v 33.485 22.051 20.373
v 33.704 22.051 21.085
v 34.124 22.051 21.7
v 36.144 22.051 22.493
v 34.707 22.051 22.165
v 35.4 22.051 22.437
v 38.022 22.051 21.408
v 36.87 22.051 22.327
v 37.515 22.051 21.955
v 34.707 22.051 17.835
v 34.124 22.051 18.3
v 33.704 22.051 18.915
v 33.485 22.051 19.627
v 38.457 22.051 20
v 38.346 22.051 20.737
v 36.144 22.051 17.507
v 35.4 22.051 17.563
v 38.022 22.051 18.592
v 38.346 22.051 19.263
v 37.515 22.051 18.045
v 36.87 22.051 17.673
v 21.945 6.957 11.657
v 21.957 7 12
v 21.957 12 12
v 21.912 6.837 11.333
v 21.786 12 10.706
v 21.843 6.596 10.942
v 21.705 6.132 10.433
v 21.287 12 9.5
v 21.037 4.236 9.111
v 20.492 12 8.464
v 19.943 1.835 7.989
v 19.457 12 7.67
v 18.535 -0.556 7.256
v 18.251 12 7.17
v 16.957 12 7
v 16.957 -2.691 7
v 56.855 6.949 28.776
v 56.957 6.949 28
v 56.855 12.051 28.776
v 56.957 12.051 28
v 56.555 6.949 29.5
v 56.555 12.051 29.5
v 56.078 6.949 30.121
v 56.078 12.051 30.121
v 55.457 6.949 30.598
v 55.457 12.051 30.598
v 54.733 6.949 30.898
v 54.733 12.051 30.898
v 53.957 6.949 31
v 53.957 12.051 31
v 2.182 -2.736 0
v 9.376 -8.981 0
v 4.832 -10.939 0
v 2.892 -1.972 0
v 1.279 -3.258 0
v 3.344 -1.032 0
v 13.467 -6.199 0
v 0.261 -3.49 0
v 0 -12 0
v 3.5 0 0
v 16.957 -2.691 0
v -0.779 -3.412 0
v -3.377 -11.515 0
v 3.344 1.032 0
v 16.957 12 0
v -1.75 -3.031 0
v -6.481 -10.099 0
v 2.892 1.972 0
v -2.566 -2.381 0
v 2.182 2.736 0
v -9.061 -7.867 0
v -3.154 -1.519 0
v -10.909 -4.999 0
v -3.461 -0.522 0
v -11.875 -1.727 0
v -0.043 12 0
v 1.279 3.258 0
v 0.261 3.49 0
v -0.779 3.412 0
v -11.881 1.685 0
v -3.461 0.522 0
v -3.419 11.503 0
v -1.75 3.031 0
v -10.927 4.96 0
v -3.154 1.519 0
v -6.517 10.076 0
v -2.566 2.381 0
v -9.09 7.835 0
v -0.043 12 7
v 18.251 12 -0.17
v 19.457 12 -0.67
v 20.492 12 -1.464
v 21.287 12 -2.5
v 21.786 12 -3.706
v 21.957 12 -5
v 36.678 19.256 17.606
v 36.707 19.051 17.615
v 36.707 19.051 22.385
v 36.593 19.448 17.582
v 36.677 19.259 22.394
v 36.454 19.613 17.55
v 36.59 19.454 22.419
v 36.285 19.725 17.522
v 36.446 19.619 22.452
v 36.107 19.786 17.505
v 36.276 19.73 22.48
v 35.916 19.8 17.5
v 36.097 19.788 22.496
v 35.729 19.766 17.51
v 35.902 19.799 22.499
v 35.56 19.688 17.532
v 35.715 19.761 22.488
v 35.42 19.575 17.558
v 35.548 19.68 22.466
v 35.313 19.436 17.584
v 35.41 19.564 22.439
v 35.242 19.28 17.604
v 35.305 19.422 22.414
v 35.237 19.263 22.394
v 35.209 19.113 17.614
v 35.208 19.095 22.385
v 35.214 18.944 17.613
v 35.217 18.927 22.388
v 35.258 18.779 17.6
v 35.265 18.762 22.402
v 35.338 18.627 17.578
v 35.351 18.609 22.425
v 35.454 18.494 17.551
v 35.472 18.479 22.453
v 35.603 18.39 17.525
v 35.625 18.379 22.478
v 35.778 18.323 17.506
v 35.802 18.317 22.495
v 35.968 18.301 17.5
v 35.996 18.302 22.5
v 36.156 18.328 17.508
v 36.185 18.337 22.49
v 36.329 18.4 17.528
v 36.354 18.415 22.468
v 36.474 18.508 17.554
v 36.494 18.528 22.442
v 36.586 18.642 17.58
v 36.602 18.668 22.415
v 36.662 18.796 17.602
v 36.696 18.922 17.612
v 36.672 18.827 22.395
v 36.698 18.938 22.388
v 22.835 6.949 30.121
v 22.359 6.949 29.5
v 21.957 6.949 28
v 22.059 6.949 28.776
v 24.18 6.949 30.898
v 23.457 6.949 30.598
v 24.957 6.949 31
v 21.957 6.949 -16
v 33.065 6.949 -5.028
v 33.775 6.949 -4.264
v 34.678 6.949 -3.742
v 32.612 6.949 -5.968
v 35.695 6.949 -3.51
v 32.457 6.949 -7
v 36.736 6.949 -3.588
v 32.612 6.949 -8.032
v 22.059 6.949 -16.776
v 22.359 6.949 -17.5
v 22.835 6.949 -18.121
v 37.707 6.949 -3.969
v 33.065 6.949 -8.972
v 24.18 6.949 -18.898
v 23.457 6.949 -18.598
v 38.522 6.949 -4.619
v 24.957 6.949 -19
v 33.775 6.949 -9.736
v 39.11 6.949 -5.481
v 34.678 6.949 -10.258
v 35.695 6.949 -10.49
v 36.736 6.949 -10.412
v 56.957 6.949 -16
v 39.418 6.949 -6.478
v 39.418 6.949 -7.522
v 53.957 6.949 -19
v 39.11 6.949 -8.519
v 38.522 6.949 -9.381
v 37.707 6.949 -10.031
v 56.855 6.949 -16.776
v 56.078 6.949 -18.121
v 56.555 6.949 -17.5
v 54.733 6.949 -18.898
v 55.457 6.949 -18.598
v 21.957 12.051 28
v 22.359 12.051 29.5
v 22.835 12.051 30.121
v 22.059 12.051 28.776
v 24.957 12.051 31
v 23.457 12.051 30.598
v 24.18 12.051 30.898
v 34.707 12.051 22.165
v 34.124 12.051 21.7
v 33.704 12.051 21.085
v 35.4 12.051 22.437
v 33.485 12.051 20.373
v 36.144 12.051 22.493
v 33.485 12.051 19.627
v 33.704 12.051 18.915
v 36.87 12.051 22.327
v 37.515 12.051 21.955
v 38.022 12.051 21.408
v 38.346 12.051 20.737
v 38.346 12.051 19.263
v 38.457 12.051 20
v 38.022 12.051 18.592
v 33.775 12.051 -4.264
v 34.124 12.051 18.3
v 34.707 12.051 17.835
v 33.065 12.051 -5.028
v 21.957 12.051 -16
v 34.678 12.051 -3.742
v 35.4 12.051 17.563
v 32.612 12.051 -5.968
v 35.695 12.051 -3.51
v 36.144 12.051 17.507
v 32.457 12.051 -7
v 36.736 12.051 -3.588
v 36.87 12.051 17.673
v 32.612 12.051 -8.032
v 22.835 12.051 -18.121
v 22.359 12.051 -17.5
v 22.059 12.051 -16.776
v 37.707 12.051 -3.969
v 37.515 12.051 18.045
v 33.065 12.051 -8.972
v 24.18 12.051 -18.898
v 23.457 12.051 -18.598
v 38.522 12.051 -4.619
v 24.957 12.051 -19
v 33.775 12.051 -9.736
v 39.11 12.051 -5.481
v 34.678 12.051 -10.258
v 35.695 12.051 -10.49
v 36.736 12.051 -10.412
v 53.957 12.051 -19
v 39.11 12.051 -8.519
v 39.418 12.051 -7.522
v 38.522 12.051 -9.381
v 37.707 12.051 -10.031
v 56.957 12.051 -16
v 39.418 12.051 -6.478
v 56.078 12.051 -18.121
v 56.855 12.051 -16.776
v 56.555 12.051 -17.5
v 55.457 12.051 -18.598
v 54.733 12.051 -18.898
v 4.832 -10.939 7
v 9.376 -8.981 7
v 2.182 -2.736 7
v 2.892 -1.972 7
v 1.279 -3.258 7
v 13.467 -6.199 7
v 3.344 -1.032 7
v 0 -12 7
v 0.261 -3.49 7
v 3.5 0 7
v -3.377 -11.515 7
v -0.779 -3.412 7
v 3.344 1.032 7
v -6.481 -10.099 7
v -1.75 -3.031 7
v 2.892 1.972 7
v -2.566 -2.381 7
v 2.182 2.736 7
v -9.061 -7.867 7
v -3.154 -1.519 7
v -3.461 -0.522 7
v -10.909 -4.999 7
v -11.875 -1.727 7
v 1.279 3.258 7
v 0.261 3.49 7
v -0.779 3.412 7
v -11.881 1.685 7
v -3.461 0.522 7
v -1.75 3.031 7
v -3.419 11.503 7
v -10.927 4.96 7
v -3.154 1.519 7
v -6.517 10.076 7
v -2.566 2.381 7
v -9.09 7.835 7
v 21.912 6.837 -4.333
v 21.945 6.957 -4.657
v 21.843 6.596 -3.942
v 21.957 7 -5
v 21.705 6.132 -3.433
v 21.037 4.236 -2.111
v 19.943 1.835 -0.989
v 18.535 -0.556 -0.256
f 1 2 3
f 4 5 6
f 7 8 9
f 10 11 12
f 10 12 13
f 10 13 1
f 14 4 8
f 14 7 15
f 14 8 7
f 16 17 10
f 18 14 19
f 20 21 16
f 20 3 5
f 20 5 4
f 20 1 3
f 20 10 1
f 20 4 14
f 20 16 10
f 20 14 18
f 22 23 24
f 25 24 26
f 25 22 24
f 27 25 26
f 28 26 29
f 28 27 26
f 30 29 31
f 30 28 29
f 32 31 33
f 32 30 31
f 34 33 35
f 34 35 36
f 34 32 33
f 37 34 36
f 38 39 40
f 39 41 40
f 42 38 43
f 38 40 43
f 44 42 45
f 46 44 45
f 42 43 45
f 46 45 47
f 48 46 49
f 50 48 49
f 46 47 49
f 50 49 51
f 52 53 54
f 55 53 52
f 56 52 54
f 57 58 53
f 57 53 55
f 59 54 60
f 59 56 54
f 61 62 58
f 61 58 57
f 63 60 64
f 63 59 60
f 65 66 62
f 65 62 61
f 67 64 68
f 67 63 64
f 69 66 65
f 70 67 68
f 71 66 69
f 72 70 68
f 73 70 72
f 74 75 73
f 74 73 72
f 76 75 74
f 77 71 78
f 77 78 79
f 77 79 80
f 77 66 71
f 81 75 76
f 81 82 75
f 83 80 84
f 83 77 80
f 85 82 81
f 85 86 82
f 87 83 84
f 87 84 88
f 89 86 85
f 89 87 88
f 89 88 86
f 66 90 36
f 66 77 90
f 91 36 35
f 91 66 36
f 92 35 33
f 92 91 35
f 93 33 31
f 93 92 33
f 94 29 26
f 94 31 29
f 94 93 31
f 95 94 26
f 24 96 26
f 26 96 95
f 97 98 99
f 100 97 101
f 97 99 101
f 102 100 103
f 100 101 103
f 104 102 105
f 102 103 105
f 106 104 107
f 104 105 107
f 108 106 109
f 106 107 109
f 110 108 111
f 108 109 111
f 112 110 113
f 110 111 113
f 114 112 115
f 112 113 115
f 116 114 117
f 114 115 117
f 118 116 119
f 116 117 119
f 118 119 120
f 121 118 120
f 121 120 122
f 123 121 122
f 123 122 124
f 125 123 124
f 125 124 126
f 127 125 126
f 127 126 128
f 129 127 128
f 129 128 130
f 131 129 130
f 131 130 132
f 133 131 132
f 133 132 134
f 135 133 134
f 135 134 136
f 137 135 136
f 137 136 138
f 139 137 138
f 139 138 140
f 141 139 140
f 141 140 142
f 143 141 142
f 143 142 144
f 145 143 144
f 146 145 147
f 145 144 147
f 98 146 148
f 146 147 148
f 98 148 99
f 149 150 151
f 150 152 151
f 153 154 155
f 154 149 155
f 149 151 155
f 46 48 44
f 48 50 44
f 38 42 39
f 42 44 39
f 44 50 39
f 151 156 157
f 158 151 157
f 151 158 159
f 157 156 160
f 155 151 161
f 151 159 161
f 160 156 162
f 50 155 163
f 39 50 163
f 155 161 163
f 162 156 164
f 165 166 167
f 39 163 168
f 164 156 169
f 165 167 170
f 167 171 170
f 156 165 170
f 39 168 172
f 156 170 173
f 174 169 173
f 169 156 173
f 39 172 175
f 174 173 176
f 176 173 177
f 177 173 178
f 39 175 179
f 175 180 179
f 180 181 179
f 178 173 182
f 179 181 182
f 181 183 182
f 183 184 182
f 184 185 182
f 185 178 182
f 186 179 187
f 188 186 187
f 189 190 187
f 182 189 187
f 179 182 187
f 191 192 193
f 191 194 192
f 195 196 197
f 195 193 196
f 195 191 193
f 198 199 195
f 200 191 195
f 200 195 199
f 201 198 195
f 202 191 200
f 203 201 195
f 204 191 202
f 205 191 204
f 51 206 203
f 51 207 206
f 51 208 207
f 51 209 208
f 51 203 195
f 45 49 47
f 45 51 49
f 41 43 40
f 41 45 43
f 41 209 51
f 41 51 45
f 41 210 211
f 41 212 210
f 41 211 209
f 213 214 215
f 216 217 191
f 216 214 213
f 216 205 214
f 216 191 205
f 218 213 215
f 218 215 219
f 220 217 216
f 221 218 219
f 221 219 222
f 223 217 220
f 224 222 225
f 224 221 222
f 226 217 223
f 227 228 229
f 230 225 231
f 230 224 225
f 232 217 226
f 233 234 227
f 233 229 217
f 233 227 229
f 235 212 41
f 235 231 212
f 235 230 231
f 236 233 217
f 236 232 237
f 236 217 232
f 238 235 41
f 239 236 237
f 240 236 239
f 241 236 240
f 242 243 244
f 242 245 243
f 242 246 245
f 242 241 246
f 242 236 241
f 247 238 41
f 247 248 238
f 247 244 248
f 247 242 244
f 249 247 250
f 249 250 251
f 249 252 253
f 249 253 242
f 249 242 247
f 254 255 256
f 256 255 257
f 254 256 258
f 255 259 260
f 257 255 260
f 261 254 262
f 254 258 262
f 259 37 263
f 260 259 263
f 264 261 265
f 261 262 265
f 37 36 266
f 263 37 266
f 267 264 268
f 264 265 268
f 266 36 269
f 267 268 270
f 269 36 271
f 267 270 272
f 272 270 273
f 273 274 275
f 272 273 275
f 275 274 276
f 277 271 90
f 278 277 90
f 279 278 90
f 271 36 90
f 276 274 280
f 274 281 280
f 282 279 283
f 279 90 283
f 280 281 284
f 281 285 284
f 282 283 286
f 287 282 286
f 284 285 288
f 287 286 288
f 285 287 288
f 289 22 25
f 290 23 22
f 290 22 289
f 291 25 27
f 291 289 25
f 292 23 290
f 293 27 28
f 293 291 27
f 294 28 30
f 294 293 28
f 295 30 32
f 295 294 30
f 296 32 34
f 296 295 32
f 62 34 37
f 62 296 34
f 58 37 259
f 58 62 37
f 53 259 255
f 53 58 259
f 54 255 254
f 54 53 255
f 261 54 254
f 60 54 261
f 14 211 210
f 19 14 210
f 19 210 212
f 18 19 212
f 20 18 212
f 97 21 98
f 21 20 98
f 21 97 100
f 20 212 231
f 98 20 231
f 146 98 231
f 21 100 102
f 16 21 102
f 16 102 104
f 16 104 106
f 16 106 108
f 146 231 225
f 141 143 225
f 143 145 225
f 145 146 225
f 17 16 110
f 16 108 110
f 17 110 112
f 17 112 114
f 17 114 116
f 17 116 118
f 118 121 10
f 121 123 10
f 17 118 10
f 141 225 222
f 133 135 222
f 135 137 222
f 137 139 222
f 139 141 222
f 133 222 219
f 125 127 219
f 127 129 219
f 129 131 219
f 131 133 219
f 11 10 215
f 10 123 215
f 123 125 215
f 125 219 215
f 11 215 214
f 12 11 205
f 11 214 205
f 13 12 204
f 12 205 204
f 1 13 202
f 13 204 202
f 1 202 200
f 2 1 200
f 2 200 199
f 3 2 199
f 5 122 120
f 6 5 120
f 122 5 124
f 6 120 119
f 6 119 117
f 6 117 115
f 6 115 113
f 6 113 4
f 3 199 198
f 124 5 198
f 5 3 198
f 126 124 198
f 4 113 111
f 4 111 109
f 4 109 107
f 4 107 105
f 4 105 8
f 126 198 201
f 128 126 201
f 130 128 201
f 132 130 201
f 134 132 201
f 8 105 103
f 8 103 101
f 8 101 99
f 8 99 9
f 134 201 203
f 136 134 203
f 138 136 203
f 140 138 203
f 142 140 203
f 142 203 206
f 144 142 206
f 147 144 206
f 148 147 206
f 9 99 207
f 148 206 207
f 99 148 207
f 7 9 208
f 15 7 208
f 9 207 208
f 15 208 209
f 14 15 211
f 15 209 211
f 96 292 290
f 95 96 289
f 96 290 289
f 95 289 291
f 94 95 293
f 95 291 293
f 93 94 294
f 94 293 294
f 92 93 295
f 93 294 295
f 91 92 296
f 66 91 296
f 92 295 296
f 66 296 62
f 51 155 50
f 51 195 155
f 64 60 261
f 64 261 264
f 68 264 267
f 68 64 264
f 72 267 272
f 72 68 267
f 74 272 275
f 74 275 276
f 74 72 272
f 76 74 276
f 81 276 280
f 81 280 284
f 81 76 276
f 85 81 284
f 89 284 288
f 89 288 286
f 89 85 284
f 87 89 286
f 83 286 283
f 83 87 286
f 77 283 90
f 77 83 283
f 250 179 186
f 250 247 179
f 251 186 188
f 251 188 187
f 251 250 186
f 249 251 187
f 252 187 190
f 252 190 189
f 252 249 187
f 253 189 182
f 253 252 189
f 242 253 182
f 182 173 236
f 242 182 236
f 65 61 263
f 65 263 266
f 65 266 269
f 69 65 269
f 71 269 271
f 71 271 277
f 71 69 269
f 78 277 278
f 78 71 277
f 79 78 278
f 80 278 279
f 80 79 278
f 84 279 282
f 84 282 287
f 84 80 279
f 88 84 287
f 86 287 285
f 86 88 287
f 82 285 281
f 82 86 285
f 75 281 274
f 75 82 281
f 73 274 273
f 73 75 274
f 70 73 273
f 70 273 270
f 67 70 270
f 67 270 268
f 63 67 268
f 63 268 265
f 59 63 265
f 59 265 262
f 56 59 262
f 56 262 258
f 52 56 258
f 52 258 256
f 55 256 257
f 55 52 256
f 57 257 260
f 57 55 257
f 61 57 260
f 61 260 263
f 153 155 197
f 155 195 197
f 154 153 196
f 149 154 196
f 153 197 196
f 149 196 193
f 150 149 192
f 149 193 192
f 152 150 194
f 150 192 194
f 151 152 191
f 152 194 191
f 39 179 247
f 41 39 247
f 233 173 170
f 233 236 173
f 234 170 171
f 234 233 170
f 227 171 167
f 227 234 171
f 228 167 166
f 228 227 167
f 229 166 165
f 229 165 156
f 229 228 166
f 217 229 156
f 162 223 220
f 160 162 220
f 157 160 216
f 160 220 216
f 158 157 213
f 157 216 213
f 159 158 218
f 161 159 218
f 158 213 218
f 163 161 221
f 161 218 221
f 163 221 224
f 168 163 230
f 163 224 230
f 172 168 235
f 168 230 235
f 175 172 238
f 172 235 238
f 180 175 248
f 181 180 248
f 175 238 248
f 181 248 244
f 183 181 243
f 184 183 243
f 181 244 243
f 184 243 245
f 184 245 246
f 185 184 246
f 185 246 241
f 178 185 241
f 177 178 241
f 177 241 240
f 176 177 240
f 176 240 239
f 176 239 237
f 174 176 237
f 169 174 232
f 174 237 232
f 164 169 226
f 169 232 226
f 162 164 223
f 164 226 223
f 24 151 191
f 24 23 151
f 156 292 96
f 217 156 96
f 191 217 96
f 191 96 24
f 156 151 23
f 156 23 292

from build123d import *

# Parameters (mm, degrees)
SKETCH1_R           = 3.5
BOSS_EXTRUDE1_DEPTH = 7
SKETCH3_W           = 45
SKETCH3_H           = 5.102229266
BOSS_EXTRUDE3_DEPTH = 35
FILLET2_R           = 5
FILLET6_R           = 5
SKETCH4_R           = 3.5
CUT_EXTRUDE1_DEPTH  = 5.102229266
SKETCH5_R           = 2.5
BOSS_EXTRUDE4_DEPTH = 10
SKETCH6_W           = 35
SKETCH6_H           = 5.102229266
BOSS_EXTRUDE5_DEPTH = 5
FILLET14_R          = 3
FILLET15_R          = 3
SKETCH7_R           = 0.75
CUT_EXTRUDE2_DEPTH  = 20


with BuildPart() as part:
    # Sketch1 → Boss-Extrude1 (new body)
    with BuildSketch(Plane.XY):
        with BuildLine():
            Line((-0.043255317, 12), (21.956744683, 12))
            Line((21.956744683, 12), (21.956744683, 7))
            ThreePointArc((21.956744683, 7), (13.877753218, -5.850552891), (-1.128e-06, -11.999922533))
            ThreePointArc((-1.128e-06, -11.999922533), (-12.000117541, -0.021549663), (-0.043255317, 12))
        make_face()
        with Locations((-0.000137029, 7.7466e-05)):
            Circle(SKETCH1_R, mode=Mode.SUBTRACT)
    extrude(amount=BOSS_EXTRUDE1_DEPTH)

    # Sketch3 → Boss-Extrude3 (add)
    with BuildSketch(Plane(origin=(21.956744683, 0, 0), x_dir=(0, 0, -1), z_dir=(1, 0, 0))):
        with Locations((-3.5, 9.5)):
            Rectangle(SKETCH3_W, SKETCH3_H)
    extrude(amount=BOSS_EXTRUDE3_DEPTH)

    # Fillet2
    fillet2_edges = [part.edges().sort_by_distance(p)[0] for p in [
        (21.956744683, 9.5, 0),
    ]]
    fillet(fillet2_edges, radius=FILLET2_R)

    # Fillet6
    fillet6_edges = [part.edges().sort_by_distance(p)[0] for p in [
        (21.956744683, 9.5, 7),
    ]]
    fillet(fillet6_edges, radius=FILLET6_R)

    # Sketch4 → Cut-Extrude1 (cut)
    with BuildSketch(Plane(origin=(0, 12.051114633, 0), x_dir=(1, 0, 0), z_dir=(0, 1, 0))):
        with Locations(Location((35.956744683, 7, 0), (0, 0, 180))):
            Circle(SKETCH4_R)
    extrude(amount=-CUT_EXTRUDE1_DEPTH, mode=Mode.SUBTRACT)

    # Sketch5 → Boss-Extrude4 (add)
    with BuildSketch(Plane(origin=(0, 12.051114633, 0), x_dir=(1, 0, 0), z_dir=(0, 1, 0))):
        with Locations((35.956744683, -20)):
            Circle(SKETCH5_R)
    extrude(amount=BOSS_EXTRUDE4_DEPTH)

    # Sketch6 → Boss-Extrude5 (add)
    with BuildSketch(Plane.XY.offset(26)):
        with Locations((39.456744683, 9.5)):
            Rectangle(SKETCH6_W, SKETCH6_H)
    extrude(amount=BOSS_EXTRUDE5_DEPTH)

    # Fillet14
    fillet14_edges = [part.edges().sort_by_distance(p)[0] for p in [
        (56.956744683, 9.5, -19),
    ]]
    fillet(fillet14_edges, radius=FILLET14_R)

    # Fillet15
    fillet15_edges = [part.edges().sort_by_distance(p)[0] for p in [
        (21.956744683, 9.5, -19),
        (21.956744683, 9.5, 31),
        (56.956744683, 9.5, 31),
    ]]
    fillet(fillet15_edges, radius=FILLET15_R)

    # Sketch7 → Cut-Extrude2 (cut)
    with BuildSketch(Plane.XY.offset(31)):
        with Locations((35.956744683, 19.051114633)):
            Circle(SKETCH7_R)
    extrude(amount=-CUT_EXTRUDE2_DEPTH, mode=Mode.SUBTRACT)


solid = part.part
